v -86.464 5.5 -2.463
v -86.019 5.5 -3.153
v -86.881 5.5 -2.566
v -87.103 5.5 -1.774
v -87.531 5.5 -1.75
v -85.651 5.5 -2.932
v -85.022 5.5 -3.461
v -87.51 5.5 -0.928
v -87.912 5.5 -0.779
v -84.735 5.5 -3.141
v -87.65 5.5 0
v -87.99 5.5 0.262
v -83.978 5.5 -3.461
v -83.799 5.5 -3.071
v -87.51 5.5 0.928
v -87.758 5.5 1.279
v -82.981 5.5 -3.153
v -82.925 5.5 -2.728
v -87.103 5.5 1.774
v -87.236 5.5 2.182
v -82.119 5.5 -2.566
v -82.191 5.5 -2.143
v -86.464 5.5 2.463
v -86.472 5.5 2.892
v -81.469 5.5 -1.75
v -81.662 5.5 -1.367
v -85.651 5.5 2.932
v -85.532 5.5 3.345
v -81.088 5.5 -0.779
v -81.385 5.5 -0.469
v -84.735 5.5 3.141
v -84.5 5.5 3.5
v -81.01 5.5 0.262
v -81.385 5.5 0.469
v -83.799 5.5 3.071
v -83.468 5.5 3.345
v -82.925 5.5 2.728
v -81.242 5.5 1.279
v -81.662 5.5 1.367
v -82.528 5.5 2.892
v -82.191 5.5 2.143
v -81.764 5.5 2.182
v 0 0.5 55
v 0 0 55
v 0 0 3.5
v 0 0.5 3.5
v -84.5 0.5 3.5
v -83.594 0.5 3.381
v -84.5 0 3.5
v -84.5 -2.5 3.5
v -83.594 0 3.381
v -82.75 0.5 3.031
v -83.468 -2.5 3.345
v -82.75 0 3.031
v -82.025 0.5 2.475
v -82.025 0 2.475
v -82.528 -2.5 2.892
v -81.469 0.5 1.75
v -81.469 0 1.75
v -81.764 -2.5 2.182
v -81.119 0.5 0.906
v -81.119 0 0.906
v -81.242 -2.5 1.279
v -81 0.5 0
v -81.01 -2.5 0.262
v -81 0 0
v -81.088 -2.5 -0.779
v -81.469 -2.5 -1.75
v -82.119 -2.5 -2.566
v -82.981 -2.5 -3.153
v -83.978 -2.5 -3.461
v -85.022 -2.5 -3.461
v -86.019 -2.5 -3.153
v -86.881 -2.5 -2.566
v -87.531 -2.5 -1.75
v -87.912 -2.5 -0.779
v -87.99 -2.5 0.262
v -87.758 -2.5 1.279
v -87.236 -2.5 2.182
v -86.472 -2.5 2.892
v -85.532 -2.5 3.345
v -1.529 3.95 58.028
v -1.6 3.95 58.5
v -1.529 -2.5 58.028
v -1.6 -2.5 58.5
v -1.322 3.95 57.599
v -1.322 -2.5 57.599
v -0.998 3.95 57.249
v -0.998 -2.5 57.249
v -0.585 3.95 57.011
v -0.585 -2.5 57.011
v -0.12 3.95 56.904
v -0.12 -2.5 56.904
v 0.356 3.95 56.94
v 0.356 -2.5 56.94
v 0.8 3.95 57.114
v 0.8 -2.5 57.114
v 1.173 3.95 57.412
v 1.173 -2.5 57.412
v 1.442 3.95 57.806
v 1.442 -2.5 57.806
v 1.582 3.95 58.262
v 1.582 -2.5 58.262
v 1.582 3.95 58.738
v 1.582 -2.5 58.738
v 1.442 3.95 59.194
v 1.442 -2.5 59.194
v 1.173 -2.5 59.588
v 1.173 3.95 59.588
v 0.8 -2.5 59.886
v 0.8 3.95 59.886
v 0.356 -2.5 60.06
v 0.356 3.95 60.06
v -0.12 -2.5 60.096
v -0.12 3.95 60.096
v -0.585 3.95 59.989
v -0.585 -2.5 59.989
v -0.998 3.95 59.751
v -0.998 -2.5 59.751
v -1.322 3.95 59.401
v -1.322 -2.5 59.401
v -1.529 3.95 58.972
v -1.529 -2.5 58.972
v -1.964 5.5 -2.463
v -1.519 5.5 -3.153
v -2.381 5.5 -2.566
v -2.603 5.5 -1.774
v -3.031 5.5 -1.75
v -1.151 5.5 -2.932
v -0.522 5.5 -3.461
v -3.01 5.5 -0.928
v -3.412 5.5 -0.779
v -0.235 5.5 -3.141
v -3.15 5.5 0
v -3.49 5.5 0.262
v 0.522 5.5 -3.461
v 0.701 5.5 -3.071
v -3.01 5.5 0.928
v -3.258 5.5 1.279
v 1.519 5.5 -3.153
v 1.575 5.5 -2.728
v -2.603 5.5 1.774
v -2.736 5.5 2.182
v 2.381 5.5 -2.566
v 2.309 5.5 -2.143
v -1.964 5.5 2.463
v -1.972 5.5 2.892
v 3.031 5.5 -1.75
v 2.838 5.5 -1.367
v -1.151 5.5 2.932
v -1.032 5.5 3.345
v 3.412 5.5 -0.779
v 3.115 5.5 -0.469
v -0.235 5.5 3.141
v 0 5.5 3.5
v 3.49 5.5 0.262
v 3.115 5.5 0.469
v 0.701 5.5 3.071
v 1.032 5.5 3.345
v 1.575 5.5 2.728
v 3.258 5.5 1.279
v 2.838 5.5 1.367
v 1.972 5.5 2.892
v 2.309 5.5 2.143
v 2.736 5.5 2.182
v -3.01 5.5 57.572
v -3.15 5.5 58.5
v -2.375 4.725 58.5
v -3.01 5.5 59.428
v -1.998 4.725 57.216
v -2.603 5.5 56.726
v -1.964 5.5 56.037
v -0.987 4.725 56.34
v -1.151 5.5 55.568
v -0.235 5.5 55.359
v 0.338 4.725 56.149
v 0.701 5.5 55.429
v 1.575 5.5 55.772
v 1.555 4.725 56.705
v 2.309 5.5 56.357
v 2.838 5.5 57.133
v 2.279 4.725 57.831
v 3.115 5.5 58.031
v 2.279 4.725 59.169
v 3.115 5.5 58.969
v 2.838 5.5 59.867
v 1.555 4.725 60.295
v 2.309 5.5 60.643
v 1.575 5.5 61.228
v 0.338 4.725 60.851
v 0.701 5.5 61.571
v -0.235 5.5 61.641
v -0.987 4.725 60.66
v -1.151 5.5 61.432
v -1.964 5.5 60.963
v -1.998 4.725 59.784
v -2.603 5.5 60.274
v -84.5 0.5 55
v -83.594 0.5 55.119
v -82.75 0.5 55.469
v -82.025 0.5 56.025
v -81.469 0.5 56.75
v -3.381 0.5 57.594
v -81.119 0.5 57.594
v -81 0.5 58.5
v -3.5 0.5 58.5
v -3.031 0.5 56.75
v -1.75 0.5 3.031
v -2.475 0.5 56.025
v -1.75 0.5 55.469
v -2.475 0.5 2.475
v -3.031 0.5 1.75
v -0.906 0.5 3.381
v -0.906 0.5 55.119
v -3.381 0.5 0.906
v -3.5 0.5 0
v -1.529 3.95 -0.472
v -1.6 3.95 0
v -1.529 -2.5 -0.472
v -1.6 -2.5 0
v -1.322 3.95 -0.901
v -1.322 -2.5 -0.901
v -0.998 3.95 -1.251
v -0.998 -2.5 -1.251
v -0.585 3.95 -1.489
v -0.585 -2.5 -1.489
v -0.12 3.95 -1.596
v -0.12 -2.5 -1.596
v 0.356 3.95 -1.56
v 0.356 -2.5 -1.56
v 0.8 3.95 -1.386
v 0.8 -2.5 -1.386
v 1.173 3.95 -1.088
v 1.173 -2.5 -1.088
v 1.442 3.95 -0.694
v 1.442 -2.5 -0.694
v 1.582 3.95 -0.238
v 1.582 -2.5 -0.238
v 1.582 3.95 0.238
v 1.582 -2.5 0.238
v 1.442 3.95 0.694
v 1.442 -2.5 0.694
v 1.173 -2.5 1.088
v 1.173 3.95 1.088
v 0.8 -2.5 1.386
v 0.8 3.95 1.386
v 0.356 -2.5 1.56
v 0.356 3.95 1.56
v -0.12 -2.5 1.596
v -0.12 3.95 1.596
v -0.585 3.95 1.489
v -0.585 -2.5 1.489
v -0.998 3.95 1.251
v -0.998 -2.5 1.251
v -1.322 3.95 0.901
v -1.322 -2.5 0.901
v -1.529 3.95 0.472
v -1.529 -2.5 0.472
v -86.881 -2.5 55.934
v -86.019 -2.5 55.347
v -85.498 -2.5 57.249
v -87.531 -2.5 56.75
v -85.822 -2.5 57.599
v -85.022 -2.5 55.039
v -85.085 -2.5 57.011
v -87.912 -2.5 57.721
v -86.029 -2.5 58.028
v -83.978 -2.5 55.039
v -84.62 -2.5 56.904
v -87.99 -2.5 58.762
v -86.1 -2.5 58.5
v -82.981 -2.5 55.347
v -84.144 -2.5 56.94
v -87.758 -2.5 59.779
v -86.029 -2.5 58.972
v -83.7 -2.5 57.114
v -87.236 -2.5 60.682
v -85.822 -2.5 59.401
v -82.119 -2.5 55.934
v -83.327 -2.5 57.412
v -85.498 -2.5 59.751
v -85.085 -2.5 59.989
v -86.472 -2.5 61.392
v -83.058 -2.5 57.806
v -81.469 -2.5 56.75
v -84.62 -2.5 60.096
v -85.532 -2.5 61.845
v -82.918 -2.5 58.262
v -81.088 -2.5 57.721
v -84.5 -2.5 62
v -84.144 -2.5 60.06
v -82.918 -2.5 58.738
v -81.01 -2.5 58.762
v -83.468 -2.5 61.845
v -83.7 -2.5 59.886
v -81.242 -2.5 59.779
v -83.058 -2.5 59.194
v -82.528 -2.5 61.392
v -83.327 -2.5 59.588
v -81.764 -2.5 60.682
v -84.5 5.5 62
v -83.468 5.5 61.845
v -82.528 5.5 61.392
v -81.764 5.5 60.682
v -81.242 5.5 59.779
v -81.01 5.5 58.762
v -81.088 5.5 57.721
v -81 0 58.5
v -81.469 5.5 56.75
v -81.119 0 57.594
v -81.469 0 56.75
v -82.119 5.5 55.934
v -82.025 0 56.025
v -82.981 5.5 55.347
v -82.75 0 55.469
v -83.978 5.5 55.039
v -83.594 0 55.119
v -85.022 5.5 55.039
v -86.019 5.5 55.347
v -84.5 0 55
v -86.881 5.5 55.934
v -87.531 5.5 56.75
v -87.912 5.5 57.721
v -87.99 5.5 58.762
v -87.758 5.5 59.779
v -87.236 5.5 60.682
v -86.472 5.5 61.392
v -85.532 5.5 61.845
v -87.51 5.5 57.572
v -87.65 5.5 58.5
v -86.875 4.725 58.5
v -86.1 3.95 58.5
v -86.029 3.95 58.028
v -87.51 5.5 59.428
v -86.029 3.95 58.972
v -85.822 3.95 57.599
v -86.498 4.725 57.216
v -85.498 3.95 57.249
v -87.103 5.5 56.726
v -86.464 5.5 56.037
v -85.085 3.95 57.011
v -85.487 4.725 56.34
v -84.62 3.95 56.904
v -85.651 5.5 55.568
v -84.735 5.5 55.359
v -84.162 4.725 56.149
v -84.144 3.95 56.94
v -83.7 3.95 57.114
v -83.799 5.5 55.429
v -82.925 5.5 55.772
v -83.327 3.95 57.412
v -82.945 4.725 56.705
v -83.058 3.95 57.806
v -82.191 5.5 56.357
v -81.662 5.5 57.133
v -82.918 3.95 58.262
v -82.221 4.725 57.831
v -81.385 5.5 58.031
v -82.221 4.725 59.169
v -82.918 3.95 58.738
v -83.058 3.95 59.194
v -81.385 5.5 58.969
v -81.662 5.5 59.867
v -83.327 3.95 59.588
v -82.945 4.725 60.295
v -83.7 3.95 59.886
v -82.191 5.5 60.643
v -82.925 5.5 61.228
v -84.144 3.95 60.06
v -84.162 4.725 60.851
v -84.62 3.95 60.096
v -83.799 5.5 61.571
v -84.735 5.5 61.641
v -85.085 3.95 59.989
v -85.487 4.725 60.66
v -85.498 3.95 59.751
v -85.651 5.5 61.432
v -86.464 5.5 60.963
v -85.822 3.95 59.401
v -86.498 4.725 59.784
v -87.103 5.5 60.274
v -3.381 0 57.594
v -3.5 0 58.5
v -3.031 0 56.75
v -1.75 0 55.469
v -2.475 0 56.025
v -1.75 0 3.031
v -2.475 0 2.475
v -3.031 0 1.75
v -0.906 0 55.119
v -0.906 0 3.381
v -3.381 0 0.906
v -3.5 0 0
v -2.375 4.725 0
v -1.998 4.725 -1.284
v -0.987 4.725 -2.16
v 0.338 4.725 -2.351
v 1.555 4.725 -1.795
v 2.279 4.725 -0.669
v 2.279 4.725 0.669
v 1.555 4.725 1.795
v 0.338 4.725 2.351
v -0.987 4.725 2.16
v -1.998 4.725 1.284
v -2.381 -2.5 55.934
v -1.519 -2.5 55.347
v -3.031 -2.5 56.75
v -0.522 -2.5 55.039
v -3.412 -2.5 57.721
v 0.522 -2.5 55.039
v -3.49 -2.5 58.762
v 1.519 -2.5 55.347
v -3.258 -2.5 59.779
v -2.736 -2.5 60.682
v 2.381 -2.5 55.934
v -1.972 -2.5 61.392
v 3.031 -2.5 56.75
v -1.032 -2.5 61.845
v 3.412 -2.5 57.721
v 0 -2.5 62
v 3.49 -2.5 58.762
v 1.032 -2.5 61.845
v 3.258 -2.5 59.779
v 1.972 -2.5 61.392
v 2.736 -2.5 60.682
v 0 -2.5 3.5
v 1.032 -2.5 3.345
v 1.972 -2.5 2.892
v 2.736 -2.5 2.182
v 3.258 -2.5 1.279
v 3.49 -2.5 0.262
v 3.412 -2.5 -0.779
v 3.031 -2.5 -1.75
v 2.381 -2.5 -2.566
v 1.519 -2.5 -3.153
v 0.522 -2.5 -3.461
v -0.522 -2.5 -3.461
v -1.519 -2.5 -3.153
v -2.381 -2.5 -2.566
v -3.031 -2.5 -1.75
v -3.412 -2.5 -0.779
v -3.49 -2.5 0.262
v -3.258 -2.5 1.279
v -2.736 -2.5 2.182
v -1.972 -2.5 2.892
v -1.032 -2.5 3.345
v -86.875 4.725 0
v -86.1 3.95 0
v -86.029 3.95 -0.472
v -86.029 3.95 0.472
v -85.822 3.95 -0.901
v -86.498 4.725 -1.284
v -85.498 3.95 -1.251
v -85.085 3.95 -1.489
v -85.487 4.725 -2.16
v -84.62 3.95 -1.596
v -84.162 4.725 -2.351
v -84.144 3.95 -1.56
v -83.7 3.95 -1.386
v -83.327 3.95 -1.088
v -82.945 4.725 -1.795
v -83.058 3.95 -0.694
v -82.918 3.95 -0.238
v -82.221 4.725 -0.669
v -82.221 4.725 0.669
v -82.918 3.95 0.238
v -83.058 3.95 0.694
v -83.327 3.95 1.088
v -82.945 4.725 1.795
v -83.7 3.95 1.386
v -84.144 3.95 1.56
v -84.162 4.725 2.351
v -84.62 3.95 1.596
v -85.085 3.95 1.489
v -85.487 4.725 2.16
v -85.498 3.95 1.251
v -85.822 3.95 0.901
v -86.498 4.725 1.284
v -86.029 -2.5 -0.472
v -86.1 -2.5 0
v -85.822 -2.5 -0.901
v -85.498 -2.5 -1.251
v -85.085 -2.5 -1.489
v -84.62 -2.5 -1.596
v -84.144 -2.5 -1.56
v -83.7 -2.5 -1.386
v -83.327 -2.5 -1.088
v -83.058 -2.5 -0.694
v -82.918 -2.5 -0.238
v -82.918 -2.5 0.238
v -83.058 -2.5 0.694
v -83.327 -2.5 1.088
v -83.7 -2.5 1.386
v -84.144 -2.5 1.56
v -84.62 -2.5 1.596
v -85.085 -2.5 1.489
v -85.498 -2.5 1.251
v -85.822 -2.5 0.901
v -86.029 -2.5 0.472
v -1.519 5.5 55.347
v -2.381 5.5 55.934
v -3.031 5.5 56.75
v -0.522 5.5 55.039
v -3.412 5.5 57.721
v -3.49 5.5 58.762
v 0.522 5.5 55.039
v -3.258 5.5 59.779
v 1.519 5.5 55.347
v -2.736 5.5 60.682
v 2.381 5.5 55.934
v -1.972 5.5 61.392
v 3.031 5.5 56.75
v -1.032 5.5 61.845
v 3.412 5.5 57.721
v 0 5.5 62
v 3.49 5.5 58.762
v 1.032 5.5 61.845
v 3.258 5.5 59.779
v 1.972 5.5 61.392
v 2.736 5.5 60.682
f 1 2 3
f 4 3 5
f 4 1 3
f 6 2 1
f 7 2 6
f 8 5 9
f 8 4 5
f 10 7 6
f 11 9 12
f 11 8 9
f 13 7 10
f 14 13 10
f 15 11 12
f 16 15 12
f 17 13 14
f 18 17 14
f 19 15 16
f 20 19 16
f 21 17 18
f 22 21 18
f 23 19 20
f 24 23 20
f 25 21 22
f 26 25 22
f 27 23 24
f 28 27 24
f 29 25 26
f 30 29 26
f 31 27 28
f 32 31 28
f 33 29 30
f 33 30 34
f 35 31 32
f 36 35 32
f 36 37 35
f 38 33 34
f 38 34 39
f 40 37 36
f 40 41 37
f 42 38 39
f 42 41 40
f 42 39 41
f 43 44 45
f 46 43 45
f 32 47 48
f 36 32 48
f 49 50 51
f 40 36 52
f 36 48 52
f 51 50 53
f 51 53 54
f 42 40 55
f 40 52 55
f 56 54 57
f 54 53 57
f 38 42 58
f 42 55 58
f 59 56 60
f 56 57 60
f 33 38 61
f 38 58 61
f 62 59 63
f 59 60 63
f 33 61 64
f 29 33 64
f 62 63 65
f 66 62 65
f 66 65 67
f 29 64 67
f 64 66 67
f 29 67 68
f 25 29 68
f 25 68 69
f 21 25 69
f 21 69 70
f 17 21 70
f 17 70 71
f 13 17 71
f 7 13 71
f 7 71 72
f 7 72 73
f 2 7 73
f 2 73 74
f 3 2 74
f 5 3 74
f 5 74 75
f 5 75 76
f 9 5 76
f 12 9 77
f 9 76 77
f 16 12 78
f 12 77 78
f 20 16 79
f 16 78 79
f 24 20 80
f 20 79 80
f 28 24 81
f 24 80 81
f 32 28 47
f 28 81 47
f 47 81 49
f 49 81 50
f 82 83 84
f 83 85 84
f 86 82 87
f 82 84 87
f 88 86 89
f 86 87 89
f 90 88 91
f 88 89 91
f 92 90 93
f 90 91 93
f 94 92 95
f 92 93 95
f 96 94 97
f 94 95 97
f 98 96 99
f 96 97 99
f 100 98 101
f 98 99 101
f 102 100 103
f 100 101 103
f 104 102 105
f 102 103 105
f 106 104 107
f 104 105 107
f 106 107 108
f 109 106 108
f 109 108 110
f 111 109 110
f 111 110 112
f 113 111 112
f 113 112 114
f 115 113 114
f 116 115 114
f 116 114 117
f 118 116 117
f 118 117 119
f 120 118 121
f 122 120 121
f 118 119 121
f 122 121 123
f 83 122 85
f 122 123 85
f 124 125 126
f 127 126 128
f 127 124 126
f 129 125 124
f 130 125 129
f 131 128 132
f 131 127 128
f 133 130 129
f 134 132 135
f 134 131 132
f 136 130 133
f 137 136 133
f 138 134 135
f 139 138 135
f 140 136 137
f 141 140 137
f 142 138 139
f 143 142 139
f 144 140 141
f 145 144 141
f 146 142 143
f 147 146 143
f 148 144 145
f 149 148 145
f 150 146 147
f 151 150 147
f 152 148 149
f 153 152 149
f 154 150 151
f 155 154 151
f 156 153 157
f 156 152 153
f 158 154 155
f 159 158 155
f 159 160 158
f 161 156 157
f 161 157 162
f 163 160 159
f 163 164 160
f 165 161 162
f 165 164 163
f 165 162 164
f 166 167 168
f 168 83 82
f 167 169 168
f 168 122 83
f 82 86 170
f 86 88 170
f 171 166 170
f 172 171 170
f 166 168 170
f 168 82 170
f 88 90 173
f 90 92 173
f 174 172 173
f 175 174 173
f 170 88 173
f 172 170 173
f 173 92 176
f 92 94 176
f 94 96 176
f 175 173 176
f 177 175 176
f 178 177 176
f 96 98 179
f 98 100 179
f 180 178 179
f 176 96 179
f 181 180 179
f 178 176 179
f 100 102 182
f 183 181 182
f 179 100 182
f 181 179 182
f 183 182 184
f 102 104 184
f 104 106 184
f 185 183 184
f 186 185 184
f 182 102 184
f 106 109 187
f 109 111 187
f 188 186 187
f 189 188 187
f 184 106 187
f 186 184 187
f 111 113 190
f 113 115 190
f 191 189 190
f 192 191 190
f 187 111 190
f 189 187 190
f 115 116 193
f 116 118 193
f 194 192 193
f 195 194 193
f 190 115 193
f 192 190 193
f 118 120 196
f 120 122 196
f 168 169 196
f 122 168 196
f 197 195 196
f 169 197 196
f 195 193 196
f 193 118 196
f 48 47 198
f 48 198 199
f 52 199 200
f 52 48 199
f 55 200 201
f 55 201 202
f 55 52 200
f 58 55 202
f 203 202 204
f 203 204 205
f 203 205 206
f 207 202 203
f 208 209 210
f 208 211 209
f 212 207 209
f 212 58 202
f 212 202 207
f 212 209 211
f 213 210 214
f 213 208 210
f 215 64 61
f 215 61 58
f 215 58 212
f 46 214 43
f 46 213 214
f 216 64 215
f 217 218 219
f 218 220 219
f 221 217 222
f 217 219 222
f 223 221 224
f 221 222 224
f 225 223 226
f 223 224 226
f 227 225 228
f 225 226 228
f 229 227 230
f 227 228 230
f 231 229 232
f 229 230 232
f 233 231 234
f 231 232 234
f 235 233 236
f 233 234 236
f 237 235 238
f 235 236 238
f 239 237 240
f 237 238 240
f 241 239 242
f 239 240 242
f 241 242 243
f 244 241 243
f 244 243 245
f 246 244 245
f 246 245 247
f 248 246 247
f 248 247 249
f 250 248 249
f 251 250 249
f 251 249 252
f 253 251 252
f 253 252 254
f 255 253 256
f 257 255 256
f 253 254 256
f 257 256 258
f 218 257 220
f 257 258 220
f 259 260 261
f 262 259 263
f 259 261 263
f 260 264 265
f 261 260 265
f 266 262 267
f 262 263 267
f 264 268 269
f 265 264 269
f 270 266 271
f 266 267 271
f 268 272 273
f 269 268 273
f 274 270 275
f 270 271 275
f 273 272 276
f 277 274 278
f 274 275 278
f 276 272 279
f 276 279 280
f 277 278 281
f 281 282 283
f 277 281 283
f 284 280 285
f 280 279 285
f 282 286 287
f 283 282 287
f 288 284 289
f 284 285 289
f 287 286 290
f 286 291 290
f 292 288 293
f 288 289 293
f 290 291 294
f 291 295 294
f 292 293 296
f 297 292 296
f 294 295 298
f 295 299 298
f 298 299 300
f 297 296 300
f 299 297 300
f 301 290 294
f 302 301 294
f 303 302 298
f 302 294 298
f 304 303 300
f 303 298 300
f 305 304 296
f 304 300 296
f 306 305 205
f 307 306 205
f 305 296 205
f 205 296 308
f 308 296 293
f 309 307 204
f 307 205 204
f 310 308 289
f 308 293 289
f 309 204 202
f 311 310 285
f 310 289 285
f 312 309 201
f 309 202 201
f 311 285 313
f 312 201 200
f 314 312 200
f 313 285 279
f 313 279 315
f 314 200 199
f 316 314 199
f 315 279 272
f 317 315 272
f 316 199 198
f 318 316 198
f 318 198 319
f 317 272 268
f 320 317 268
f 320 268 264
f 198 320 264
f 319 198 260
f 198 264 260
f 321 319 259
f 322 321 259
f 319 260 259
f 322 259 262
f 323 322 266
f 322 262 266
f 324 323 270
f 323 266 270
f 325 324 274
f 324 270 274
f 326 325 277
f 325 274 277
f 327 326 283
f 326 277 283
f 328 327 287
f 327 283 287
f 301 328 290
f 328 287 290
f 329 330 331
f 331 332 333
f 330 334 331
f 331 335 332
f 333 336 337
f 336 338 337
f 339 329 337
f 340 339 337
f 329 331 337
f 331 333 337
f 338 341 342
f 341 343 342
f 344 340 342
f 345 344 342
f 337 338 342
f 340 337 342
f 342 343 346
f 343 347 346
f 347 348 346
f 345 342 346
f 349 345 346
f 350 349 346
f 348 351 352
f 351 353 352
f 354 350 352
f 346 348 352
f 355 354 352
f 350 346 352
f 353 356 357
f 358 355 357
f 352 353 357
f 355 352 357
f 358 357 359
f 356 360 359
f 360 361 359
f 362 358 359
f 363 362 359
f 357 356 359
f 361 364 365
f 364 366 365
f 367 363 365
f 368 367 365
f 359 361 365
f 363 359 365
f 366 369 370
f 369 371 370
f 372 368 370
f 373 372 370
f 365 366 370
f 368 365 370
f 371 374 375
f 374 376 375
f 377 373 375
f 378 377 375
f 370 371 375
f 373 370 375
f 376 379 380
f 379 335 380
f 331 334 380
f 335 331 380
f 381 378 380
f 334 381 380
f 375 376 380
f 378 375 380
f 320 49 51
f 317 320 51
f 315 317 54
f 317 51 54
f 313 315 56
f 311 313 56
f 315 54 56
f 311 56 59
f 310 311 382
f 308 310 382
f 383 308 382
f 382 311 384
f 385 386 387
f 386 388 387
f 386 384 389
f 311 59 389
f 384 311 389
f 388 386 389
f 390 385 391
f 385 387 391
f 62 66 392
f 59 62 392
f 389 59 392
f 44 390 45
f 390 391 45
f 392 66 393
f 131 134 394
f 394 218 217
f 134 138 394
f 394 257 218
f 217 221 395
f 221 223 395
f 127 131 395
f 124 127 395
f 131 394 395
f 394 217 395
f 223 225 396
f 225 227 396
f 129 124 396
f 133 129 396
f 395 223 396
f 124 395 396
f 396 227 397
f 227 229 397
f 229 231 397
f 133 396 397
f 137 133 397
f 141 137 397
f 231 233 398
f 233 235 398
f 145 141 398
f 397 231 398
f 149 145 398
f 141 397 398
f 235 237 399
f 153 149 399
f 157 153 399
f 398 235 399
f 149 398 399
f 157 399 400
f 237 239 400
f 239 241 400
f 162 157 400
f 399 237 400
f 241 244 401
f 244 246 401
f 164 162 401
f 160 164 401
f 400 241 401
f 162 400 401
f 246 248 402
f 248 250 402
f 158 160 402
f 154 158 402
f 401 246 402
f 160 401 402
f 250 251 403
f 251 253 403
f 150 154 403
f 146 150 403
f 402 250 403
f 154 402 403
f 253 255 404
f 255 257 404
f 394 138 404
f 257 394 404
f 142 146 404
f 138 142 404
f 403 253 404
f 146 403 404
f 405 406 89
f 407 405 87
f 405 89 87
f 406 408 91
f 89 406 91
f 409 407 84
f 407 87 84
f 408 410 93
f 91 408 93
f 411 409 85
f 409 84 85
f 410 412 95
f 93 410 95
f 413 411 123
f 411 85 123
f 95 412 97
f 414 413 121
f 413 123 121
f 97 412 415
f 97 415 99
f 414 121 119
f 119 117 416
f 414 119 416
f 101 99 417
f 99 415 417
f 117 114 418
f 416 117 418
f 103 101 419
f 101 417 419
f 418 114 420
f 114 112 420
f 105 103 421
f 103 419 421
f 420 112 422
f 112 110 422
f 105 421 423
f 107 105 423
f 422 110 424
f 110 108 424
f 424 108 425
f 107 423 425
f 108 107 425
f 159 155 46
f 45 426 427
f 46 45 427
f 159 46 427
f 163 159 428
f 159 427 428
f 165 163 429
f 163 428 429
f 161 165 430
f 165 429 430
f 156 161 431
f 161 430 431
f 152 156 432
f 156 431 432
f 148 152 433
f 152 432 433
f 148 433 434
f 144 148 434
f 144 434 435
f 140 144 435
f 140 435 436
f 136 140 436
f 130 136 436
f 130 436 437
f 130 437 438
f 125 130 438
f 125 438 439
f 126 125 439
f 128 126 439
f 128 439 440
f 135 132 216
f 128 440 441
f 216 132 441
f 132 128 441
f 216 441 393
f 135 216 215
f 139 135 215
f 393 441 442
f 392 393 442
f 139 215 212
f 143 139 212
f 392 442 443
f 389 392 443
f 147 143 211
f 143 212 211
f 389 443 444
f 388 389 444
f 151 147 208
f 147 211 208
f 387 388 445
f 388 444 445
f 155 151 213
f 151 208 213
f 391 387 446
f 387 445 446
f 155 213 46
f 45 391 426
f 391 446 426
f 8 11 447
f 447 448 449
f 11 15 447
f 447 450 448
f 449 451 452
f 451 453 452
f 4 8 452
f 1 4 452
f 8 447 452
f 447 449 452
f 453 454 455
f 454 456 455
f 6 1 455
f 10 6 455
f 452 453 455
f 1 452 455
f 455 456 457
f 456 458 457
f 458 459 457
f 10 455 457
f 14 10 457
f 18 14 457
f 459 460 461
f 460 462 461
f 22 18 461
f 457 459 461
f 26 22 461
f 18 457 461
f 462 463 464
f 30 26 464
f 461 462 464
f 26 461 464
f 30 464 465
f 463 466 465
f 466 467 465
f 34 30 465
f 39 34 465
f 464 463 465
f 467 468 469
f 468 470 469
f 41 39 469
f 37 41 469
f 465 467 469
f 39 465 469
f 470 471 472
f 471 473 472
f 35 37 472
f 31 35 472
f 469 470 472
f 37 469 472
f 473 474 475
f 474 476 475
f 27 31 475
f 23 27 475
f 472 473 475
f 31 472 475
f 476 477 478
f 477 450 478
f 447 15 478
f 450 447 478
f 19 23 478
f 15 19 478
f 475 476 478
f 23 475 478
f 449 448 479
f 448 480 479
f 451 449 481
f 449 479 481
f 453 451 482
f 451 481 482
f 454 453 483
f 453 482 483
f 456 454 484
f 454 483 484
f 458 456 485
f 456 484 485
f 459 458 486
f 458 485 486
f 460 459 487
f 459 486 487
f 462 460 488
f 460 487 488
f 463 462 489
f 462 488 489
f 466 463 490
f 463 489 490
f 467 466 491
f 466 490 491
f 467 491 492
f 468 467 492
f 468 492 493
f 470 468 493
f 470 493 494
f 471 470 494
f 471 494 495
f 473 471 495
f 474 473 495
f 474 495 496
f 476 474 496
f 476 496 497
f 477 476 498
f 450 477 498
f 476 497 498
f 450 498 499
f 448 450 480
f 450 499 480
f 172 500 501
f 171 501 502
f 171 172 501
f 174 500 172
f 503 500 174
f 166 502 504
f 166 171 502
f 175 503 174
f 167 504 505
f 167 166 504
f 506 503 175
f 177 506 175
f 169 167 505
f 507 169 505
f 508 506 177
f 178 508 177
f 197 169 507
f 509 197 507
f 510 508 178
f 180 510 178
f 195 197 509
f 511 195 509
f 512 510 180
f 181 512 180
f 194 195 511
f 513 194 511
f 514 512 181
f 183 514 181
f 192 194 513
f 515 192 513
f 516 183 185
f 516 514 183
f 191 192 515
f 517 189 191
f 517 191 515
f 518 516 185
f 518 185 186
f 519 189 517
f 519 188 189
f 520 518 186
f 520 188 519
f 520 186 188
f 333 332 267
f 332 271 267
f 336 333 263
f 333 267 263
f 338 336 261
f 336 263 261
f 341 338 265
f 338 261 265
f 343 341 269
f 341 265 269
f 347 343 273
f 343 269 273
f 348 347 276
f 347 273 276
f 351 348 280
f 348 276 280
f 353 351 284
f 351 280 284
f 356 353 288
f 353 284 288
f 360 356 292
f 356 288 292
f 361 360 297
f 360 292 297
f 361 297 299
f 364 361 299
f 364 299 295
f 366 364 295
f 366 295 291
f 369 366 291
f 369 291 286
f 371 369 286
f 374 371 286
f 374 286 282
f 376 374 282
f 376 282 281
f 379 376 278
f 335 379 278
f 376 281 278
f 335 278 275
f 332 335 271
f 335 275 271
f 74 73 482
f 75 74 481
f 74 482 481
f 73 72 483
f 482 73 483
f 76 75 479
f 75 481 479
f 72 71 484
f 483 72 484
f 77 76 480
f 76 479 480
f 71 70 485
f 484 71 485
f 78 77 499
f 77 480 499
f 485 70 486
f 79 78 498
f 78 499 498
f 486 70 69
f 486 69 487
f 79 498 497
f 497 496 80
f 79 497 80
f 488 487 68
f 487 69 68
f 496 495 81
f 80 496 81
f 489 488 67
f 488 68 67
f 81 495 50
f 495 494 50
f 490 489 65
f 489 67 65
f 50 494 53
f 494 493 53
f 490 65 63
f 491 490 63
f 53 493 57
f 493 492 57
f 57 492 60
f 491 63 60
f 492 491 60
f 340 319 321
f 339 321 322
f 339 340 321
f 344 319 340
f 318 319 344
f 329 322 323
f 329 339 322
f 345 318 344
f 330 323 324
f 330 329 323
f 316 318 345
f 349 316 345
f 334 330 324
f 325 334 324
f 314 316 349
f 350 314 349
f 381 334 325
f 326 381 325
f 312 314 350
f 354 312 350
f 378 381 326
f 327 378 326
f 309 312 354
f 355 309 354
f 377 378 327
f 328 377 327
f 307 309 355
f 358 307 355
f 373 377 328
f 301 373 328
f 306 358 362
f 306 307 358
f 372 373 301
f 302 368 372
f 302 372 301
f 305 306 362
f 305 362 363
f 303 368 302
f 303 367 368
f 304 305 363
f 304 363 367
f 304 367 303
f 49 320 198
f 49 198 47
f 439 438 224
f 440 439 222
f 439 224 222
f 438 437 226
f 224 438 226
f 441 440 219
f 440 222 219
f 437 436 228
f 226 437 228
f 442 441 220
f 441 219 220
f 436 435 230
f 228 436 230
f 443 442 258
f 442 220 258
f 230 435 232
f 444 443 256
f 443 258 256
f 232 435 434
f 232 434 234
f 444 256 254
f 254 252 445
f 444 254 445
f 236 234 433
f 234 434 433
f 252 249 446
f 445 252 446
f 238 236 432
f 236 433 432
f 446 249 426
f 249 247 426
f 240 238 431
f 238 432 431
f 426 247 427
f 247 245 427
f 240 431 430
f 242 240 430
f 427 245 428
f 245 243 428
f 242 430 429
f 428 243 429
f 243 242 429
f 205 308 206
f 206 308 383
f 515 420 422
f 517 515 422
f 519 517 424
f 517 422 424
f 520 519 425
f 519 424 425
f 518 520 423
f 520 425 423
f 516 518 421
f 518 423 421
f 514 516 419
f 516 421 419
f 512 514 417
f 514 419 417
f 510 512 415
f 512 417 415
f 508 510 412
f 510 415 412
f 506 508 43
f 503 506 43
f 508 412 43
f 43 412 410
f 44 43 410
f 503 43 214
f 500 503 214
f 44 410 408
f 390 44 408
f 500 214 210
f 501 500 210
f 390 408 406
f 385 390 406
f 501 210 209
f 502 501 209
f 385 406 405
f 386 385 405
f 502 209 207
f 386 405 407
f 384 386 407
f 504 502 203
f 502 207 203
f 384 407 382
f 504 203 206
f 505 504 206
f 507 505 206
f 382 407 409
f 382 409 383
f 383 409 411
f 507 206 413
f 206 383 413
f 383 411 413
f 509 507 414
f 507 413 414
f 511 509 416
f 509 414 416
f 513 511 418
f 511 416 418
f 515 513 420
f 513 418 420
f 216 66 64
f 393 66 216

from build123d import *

# Parameters (mm, degrees)
SKETCH2_W                                       = 84.5
SKETCH2_H                                       = 58.5
BOSS_EXTRUDE1_DEPTH                             = 0.5
BOSS_EXTRUDE2_DEPTH                             = 5
BOSS_EXTRUDE2_DEPTH_BACK                        = 3
SKETCH3_R                                       = 3.5
BOSS_EXTRUDE3_DEPTH                             = 5
BOSS_EXTRUDE3_DEPTH_BACK                        = 3
SKETCH5_R                                       = 3.5
BOSS_EXTRUDE4_DEPTH                             = 5
BOSS_EXTRUDE4_DEPTH_BACK                        = 3
SKETCH6_R                                       = 3.5
BOSS_EXTRUDE5_DEPTH                             = 5
BOSS_EXTRUDE5_DEPTH_BACK                        = 3
SKETCH7_R                                       = 3.5
CSK_FOR_M3_FLAT_HEAD_MACHINE_SCREW1_D           = 3.2
CSK_FOR_M3_FLAT_HEAD_MACHINE_SCREW1_DEPTH       = 13.03862301
CSK_FOR_M3_FLAT_HEAD_MACHINE_SCREW1_CSINK_D     = 6.3
CSK_FOR_M3_FLAT_HEAD_MACHINE_SCREW1_CSINK_ANGLE = 90
CSK_FOR_M3_FLAT_HEAD_MACHINE_SCREW1_TIP         = 0.96137699
CSK_FOR_M3_FLAT_HEAD_MACHINE_SCREW2_D           = 3.2
CSK_FOR_M3_FLAT_HEAD_MACHINE_SCREW2_DEPTH       = 13.03862301
CSK_FOR_M3_FLAT_HEAD_MACHINE_SCREW2_CSINK_D     = 6.3
CSK_FOR_M3_FLAT_HEAD_MACHINE_SCREW2_CSINK_ANGLE = 90
CSK_FOR_M3_FLAT_HEAD_MACHINE_SCREW2_TIP         = 0.96137699
CSK_FOR_M3_FLAT_HEAD_MACHINE_SCREW3_D           = 3.2
CSK_FOR_M3_FLAT_HEAD_MACHINE_SCREW3_DEPTH       = 13.03862301
CSK_FOR_M3_FLAT_HEAD_MACHINE_SCREW3_CSINK_D     = 6.3
CSK_FOR_M3_FLAT_HEAD_MACHINE_SCREW3_CSINK_ANGLE = 90
CSK_FOR_M3_FLAT_HEAD_MACHINE_SCREW3_TIP         = 0.96137699
CSK_FOR_M3_FLAT_HEAD_MACHINE_SCREW4_D           = 3.2
CSK_FOR_M3_FLAT_HEAD_MACHINE_SCREW4_DEPTH       = 13.03862301
CSK_FOR_M3_FLAT_HEAD_MACHINE_SCREW4_CSINK_D     = 6.3
CSK_FOR_M3_FLAT_HEAD_MACHINE_SCREW4_CSINK_ANGLE = 90
CSK_FOR_M3_FLAT_HEAD_MACHINE_SCREW4_TIP         = 0.96137699


with BuildPart() as part:
    # Sketch2 → Boss-Extrude1 (new body)
    with BuildSketch(Plane(origin=(0, 0, 0), x_dir=(1, 0, 0), z_dir=(0, 1, 0))):
        with Locations((-42.25, -29.25)):
            Rectangle(SKETCH2_W, SKETCH2_H)
    extrude(amount=BOSS_EXTRUDE1_DEPTH)

    # Sketch3 → Boss-Extrude2 (add, two sides: drawn at the far end of the back side and taken through both)
    with BuildSketch(Plane(origin=(0, 0.5, 0), x_dir=(1, 0, 0), z_dir=(0, 1, 0)).offset(-BOSS_EXTRUDE2_DEPTH_BACK)):
        with Locations(Location((-84.5, 0, 0), (0, 0, 270))):
            Circle(SKETCH3_R)
    extrude(amount=BOSS_EXTRUDE2_DEPTH + BOSS_EXTRUDE2_DEPTH_BACK)

    # Sketch5 → Boss-Extrude3 (add, two sides: drawn at the far end of the back side and taken through both)
    with BuildSketch(Plane(origin=(0, 0.5, 0), x_dir=(1, 0, 0), z_dir=(0, 1, 0)).offset(-BOSS_EXTRUDE3_DEPTH_BACK)):
        with Locations(Location((-84.5, -58.5, 0), (0, 0, 270))):
            Circle(SKETCH5_R)
    extrude(amount=BOSS_EXTRUDE3_DEPTH + BOSS_EXTRUDE3_DEPTH_BACK)

    # Sketch6 → Boss-Extrude4 (add, two sides: drawn at the far end of the back side and taken through both)
    with BuildSketch(Plane(origin=(0, 0.5, 0), x_dir=(1, 0, 0), z_dir=(0, 1, 0)).offset(-BOSS_EXTRUDE4_DEPTH_BACK)):
        with Locations(Location((0, -58.5, 0), (0, 0, 270))):
            Circle(SKETCH6_R)
    extrude(amount=BOSS_EXTRUDE4_DEPTH + BOSS_EXTRUDE4_DEPTH_BACK)

    # Sketch7 → Boss-Extrude5 (add, two sides: drawn at the far end of the back side and taken through both)
    with BuildSketch(Plane(origin=(0, 0.5, 0), x_dir=(1, 0, 0), z_dir=(0, 1, 0)).offset(-BOSS_EXTRUDE5_DEPTH_BACK)):
        with Locations(Location((0, 0, 0), (0, 0, 270))):
            Circle(SKETCH7_R)
    extrude(amount=BOSS_EXTRUDE5_DEPTH + BOSS_EXTRUDE5_DEPTH_BACK)

    # CSK for M3 Flat Head Machine Screw1
    with Locations(Plane(origin=(0, 5.5, 0), x_dir=(1, 0, 0), z_dir=(0, 1, 0))):
        with Locations((-84.5, 0)):
            CounterSinkHole(CSK_FOR_M3_FLAT_HEAD_MACHINE_SCREW1_D / 2, CSK_FOR_M3_FLAT_HEAD_MACHINE_SCREW1_CSINK_D / 2, depth=CSK_FOR_M3_FLAT_HEAD_MACHINE_SCREW1_DEPTH, counter_sink_angle=CSK_FOR_M3_FLAT_HEAD_MACHINE_SCREW1_CSINK_ANGLE)
            with Locations((0, 0, -(CSK_FOR_M3_FLAT_HEAD_MACHINE_SCREW1_DEPTH + CSK_FOR_M3_FLAT_HEAD_MACHINE_SCREW1_TIP / 2))):  # 118° drill point
                Cone(0, CSK_FOR_M3_FLAT_HEAD_MACHINE_SCREW1_D / 2, CSK_FOR_M3_FLAT_HEAD_MACHINE_SCREW1_TIP, mode=Mode.SUBTRACT)

    # CSK for M3 Flat Head Machine Screw2
    with Locations(Plane(origin=(0, 5.5, 0), x_dir=(1, 0, 0), z_dir=(0, 1, 0))):
        with Locations((-84.5, -58.5)):
            CounterSinkHole(CSK_FOR_M3_FLAT_HEAD_MACHINE_SCREW2_D / 2, CSK_FOR_M3_FLAT_HEAD_MACHINE_SCREW2_CSINK_D / 2, depth=CSK_FOR_M3_FLAT_HEAD_MACHINE_SCREW2_DEPTH, counter_sink_angle=CSK_FOR_M3_FLAT_HEAD_MACHINE_SCREW2_CSINK_ANGLE)
            with Locations((0, 0, -(CSK_FOR_M3_FLAT_HEAD_MACHINE_SCREW2_DEPTH + CSK_FOR_M3_FLAT_HEAD_MACHINE_SCREW2_TIP / 2))):  # 118° drill point
                Cone(0, CSK_FOR_M3_FLAT_HEAD_MACHINE_SCREW2_D / 2, CSK_FOR_M3_FLAT_HEAD_MACHINE_SCREW2_TIP, mode=Mode.SUBTRACT)

    # CSK for M3 Flat Head Machine Screw3
    with Locations(Plane(origin=(0, 5.5, 0), x_dir=(1, 0, 0), z_dir=(0, 1, 0))):
        with Locations((0, 0)):
            CounterSinkHole(CSK_FOR_M3_FLAT_HEAD_MACHINE_SCREW3_D / 2, CSK_FOR_M3_FLAT_HEAD_MACHINE_SCREW3_CSINK_D / 2, depth=CSK_FOR_M3_FLAT_HEAD_MACHINE_SCREW3_DEPTH, counter_sink_angle=CSK_FOR_M3_FLAT_HEAD_MACHINE_SCREW3_CSINK_ANGLE)
            with Locations((0, 0, -(CSK_FOR_M3_FLAT_HEAD_MACHINE_SCREW3_DEPTH + CSK_FOR_M3_FLAT_HEAD_MACHINE_SCREW3_TIP / 2))):  # 118° drill point
                Cone(0, CSK_FOR_M3_FLAT_HEAD_MACHINE_SCREW3_D / 2, CSK_FOR_M3_FLAT_HEAD_MACHINE_SCREW3_TIP, mode=Mode.SUBTRACT)

    # CSK for M3 Flat Head Machine Screw4
    with Locations(Plane(origin=(0, 5.5, 0), x_dir=(1, 0, 0), z_dir=(0, 1, 0))):
        with Locations((0, -58.5)):
            CounterSinkHole(CSK_FOR_M3_FLAT_HEAD_MACHINE_SCREW4_D / 2, CSK_FOR_M3_FLAT_HEAD_MACHINE_SCREW4_CSINK_D / 2, depth=CSK_FOR_M3_FLAT_HEAD_MACHINE_SCREW4_DEPTH, counter_sink_angle=CSK_FOR_M3_FLAT_HEAD_MACHINE_SCREW4_CSINK_ANGLE)
            with Locations((0, 0, -(CSK_FOR_M3_FLAT_HEAD_MACHINE_SCREW4_DEPTH + CSK_FOR_M3_FLAT_HEAD_MACHINE_SCREW4_TIP / 2))):  # 118° drill point
                Cone(0, CSK_FOR_M3_FLAT_HEAD_MACHINE_SCREW4_D / 2, CSK_FOR_M3_FLAT_HEAD_MACHINE_SCREW4_TIP, mode=Mode.SUBTRACT)


solid = part.part
